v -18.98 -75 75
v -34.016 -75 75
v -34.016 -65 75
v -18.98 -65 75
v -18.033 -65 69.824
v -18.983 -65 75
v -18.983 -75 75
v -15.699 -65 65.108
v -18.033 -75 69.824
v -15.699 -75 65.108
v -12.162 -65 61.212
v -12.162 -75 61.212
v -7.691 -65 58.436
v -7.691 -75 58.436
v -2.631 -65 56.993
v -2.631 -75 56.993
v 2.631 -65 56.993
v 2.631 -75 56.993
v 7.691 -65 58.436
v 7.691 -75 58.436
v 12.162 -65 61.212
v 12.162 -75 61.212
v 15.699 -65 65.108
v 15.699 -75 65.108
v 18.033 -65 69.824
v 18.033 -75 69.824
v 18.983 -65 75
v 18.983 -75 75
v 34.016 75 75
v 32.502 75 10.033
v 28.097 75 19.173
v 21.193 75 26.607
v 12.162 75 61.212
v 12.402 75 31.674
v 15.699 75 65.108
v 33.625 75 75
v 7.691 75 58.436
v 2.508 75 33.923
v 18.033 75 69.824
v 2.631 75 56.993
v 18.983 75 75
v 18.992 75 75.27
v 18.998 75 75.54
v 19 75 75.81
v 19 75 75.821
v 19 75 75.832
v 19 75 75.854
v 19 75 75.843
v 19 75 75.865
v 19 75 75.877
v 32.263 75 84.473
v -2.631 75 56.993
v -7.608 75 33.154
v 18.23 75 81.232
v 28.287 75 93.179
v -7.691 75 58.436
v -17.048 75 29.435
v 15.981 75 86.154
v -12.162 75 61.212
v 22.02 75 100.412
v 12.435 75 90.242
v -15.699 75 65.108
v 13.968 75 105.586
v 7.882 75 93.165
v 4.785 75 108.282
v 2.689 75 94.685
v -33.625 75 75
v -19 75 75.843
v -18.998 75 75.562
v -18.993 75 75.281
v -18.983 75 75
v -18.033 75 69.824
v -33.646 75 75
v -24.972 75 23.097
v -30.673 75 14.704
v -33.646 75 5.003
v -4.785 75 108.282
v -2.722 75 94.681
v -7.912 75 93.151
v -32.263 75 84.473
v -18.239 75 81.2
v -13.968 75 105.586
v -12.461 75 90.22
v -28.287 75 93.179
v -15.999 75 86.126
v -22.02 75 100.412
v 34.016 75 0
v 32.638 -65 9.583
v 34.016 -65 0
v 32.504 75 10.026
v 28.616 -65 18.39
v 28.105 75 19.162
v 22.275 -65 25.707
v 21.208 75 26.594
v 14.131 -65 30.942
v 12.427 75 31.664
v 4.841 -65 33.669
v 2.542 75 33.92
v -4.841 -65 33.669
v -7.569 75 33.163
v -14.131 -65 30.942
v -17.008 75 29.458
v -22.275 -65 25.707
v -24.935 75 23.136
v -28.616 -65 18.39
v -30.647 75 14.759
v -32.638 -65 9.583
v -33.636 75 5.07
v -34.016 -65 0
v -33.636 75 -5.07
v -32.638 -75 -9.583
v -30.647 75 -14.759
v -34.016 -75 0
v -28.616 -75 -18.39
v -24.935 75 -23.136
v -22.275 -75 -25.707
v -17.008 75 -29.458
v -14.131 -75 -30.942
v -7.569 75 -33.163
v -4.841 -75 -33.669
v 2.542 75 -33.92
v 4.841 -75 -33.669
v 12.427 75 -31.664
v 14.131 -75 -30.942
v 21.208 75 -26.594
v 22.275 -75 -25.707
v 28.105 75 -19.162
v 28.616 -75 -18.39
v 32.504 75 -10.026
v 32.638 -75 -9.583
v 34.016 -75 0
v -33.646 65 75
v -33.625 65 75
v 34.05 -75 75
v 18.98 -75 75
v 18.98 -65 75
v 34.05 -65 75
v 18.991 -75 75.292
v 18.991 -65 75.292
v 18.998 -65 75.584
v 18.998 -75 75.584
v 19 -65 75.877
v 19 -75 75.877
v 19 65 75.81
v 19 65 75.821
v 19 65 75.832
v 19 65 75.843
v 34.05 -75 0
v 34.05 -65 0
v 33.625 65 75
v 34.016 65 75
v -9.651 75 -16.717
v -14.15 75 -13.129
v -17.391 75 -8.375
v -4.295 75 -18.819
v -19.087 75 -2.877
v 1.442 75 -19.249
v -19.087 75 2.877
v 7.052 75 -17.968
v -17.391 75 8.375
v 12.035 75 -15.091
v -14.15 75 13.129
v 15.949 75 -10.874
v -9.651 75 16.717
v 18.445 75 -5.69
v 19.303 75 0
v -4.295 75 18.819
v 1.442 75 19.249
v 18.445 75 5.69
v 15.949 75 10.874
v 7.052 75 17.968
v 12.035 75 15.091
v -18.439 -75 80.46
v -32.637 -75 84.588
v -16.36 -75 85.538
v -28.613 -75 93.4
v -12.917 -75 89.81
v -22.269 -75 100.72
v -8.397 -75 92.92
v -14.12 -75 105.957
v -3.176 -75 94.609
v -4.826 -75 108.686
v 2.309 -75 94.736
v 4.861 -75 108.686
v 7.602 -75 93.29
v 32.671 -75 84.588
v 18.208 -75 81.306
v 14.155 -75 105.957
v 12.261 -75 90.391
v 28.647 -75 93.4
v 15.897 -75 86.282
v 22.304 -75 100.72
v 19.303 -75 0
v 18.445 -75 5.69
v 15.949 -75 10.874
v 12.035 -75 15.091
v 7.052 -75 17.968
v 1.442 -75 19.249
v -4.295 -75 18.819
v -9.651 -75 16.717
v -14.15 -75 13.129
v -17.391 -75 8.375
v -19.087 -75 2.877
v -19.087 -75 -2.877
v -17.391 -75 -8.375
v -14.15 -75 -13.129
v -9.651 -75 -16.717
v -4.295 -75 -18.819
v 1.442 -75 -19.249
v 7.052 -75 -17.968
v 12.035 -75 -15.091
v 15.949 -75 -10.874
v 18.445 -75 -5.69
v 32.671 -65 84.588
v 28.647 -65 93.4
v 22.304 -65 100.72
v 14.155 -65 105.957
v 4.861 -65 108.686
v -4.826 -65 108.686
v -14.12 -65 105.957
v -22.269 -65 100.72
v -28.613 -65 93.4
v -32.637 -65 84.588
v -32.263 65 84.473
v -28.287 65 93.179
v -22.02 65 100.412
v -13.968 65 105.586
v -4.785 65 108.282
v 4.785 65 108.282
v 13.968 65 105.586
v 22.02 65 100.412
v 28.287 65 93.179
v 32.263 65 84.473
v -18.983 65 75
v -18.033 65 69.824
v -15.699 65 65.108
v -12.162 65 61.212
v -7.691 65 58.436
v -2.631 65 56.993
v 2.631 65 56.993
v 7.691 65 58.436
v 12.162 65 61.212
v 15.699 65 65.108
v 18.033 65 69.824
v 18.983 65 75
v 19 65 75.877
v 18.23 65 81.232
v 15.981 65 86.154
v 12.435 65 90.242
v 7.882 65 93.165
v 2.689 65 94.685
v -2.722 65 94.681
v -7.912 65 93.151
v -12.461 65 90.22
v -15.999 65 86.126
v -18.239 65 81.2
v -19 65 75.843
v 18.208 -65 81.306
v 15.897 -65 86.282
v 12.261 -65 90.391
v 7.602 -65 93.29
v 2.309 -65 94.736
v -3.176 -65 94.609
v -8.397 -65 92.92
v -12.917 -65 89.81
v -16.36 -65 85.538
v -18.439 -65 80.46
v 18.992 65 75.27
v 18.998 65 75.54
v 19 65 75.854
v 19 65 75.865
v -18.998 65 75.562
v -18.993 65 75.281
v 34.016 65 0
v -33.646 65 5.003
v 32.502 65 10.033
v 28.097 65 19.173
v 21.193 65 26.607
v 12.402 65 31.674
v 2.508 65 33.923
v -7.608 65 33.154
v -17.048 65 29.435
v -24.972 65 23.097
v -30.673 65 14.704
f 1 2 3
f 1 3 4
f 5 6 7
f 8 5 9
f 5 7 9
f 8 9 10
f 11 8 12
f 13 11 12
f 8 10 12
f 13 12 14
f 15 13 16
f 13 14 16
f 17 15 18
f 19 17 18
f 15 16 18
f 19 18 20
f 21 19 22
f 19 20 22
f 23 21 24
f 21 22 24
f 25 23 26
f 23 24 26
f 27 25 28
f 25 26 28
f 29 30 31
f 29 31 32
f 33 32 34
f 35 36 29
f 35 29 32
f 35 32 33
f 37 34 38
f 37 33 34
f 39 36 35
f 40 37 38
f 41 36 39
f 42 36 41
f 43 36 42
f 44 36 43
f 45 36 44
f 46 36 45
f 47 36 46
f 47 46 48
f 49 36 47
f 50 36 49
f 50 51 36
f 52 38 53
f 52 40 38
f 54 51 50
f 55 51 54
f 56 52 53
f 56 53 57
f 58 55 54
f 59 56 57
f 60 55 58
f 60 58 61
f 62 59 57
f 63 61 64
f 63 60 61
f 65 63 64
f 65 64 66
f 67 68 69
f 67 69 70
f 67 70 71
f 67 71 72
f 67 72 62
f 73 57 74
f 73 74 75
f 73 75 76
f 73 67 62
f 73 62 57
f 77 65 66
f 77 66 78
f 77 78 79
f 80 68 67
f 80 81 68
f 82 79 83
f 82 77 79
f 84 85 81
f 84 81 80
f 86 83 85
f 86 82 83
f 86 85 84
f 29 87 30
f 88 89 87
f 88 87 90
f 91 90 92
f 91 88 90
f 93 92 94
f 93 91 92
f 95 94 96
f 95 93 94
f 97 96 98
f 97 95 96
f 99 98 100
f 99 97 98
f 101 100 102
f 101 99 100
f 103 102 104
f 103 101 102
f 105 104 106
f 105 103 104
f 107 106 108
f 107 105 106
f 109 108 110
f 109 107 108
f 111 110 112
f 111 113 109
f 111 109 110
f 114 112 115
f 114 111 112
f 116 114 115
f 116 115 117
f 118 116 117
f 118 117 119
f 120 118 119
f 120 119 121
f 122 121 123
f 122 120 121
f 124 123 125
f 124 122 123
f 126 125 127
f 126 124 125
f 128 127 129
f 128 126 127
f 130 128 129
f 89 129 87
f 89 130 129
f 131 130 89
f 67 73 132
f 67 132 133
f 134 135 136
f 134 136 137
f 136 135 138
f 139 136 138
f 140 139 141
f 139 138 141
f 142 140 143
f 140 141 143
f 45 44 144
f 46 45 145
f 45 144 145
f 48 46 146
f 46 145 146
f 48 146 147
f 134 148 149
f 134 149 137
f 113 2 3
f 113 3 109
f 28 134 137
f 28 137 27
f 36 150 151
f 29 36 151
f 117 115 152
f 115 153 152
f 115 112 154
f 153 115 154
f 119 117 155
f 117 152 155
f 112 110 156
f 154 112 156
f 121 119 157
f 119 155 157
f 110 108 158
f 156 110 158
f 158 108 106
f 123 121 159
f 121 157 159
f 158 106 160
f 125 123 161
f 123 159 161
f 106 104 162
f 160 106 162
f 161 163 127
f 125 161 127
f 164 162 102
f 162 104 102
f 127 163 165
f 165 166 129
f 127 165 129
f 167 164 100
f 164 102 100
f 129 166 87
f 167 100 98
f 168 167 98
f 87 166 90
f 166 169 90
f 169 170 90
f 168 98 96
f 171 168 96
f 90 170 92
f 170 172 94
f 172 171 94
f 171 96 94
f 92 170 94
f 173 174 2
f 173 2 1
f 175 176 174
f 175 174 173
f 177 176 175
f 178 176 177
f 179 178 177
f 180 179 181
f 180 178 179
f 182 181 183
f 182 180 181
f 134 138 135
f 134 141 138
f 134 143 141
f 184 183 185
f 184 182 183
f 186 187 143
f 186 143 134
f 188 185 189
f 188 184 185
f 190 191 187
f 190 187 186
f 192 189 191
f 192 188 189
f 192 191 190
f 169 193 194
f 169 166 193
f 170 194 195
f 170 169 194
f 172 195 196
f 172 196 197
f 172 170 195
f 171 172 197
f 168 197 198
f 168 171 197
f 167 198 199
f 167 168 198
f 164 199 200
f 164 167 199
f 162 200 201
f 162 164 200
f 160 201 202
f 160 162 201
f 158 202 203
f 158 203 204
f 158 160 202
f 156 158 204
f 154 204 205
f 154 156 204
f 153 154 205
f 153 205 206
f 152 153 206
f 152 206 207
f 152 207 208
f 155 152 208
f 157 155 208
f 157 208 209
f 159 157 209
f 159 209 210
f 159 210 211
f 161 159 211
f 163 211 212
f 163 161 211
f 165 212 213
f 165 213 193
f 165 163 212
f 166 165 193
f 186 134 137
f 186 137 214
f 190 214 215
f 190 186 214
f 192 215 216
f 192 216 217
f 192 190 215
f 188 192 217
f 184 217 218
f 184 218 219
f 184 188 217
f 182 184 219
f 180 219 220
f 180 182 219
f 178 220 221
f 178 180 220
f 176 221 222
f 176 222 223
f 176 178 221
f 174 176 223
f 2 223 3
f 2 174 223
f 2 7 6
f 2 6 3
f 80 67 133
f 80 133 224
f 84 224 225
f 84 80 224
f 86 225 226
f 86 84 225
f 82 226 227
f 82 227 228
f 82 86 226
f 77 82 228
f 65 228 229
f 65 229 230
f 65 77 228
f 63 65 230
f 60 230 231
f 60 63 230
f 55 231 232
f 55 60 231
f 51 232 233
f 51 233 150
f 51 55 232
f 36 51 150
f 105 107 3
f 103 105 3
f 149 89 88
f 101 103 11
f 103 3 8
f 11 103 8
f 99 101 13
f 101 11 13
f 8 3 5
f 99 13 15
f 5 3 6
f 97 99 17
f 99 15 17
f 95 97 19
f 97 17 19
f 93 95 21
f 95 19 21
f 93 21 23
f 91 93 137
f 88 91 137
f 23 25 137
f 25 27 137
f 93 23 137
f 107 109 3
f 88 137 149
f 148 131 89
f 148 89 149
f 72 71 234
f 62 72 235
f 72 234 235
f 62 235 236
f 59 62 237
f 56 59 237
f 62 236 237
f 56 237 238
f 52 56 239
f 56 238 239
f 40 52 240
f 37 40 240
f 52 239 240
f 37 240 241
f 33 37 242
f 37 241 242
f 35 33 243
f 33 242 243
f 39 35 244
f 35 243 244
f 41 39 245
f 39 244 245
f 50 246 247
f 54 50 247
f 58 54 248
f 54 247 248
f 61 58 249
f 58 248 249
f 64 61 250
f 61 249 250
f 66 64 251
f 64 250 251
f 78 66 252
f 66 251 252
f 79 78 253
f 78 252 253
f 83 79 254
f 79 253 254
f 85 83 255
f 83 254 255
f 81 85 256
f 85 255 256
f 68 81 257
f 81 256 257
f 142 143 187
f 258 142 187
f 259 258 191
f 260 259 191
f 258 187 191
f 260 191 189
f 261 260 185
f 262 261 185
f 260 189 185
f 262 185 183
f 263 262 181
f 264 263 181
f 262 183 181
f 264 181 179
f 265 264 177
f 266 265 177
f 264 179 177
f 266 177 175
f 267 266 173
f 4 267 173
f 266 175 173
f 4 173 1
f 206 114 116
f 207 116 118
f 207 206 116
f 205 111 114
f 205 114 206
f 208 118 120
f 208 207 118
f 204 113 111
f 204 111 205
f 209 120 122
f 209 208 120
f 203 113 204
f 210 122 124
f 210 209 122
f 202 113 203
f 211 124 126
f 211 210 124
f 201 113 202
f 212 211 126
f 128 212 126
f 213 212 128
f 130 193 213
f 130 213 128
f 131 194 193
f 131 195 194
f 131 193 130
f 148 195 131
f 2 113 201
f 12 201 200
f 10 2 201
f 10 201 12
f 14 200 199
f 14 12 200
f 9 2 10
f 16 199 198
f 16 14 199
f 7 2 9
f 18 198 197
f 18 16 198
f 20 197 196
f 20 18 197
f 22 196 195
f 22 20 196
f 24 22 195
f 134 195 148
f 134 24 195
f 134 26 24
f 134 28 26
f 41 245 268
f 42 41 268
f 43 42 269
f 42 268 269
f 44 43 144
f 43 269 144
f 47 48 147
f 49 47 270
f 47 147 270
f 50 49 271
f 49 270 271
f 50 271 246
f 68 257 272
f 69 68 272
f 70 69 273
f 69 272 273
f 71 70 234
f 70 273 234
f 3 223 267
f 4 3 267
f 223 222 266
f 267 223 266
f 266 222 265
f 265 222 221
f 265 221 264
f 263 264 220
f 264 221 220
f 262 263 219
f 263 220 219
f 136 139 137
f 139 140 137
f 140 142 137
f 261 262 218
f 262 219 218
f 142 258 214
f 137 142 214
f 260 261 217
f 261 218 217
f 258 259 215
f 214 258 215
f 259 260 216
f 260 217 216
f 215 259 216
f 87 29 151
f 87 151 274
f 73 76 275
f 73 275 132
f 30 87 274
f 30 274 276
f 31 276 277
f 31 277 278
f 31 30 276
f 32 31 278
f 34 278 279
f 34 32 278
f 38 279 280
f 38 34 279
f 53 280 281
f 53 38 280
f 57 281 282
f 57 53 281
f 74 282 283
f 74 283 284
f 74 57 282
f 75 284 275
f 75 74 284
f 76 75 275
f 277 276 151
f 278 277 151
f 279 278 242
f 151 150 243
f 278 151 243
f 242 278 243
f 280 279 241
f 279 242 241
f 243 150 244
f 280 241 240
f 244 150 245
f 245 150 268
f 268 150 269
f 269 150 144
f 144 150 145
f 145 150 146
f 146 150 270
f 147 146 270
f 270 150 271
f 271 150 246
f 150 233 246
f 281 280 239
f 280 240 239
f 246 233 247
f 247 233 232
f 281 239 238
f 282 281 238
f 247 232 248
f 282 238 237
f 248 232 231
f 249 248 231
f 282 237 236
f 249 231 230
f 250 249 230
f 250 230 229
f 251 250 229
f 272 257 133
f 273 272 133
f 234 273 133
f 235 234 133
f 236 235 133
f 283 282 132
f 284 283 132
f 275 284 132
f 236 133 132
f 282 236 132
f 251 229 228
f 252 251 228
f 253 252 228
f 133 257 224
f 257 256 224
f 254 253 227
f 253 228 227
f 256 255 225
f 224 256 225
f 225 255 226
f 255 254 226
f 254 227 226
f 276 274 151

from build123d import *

# Parameters (mm, degrees)
F0_R      = 34.0155305384
F0_R_2    = 19.302709337
F1_DEPTH  = 75
F4_DEPTH  = 10
F6_DEPTH  = 10
F8_DEPTH  = 10
F10_DEPTH = 10
F13_DEPTH = 150
F15_DEPTH = 150


with BuildPart() as f1:
    # F0 (on Front) → F1 (new body)
    with BuildSketch(Plane.XZ):
        Circle(F0_R)
        Circle(F0_R_2, mode=Mode.SUBTRACT)
    extrude(amount=F1_DEPTH)

    # F2: F1 across face


with BuildPart() as f1_1:
    add(f1.part)
    add(f1.part.mirror(Plane(origin=(0, 0, 0), x_dir=(1, 0, 0), z_dir=(0, 1, 0))))

    # F3 (on face) → F4 (join)
    with BuildSketch(Plane.XZ.offset(75)):
        with BuildLine():
            ThreePointArc((-34.0155305384, 0), (0, 34.0155305384), (34.0155305384, 0))
            Line((34.0155305384, 0), (34.0500511229, 0))
            Line((34.0500511229, 0), (34.0500511229, 75))
            Line((34.0500511229, 75), (-34.0155305384, 75))
            Line((-34.0155305384, 75), (-34.0155305384, 0))
        make_face()
    extrude(amount=-F4_DEPTH)


with BuildPart() as f6:
    # F5 (on face) → F6 (new body)
    with BuildSketch(Plane(origin=(0, 75, 0), x_dir=(-1, 0, 0), z_dir=(0, 1, 0))):
        with BuildLine():
            ThreePointArc((-34.0155305384, 0), (-2.5084884013, 33.9229097182), (33.6455516517, 5.0033160864))
            Line((33.6455516517, 5.0033160864), (33.6455516517, 75))
            Line((33.6455516517, 75), (-34.0155305384, 75))
            Line((-34.0155305384, 75), (-34.0155305384, 0))
        make_face()
    extrude(amount=-F6_DEPTH)

    # F9 (on face) → F10 (join)
    with BuildSketch(Plane(origin=(0, 75, 0), x_dir=(-1, 0, 0), z_dir=(0, 1, 0))):
        with BuildLine():
            Line((-33.6247164241, 75), (33.6247164241, 75))
            ThreePointArc((33.6247164241, 75), (0, 108.6247164241), (-33.6247164241, 75))
        make_face()
    extrude(amount=-F10_DEPTH)


with BuildPart() as f8:
    # F7 (on face) → F8 (new body)
    with BuildSketch(Plane.XZ.offset(75)):
        with BuildLine():
            Line((-34.0155305384, 75), (34.0500511229, 75))
            ThreePointArc((34.0500511229, 75), (0.0172602923, 109.0327908307), (-34.0155305384, 75))
        make_face()
    extrude(amount=-F8_DEPTH)


with BuildPart() as f13_tool:
    # F12 (on face) → F13 (new body)
    with BuildSketch(Plane.XZ.offset(75)):
        with BuildLine():
            ThreePointArc((18.9827272831, 75), (18.99568133, 75.4048970909), (19, 75.8099783304))
            ThreePointArc((19, 75.8099783304), (-0.4050812395, 94.8056596604), (-18.9827272831, 75))
            Line((-18.9827272831, 75), (18.9827272831, 75))
        make_face()
        with BuildLine():
            Line((18.9827272831, 75), (-18.9827272831, 75))
            ThreePointArc((-18.9827272831, 75), (0, 56.8099783304), (18.9827272831, 75))
        make_face()
    extrude(amount=-F13_DEPTH)


with BuildPart() as f1_2:
    add(f1_1.part)

    # F13: cut by f13_tool
    add(f13_tool.part, mode=Mode.SUBTRACT)


with BuildPart() as f6_1:
    add(f6.part)

    # F13: cut by f13_tool
    add(f13_tool.part, mode=Mode.SUBTRACT)


with BuildPart() as f15_tool:
    # F14 (on face) → F15 (new body)
    with BuildSketch(Plane.XZ.offset(75)):
        with BuildLine():
            ThreePointArc((18.9797715307, 75), (18.9949422095, 75.4381391222), (19, 75.8765116334))
            ThreePointArc((19, 75.8765116334), (-0.4383725112, 94.8714538429), (-18.9797715307, 75))
            Line((-18.9797715307, 75), (18.9797715307, 75))
        make_face()
    extrude(amount=-F15_DEPTH)


with BuildPart() as f6_2:
    add(f6_1.part)

    # F15: cut by f15_tool
    add(f15_tool.part, mode=Mode.SUBTRACT)


with BuildPart() as f8_1:
    add(f8.part)

    # F15: cut by f15_tool
    add(f15_tool.part, mode=Mode.SUBTRACT)


solid = Compound([f1_2.part, f6_2.part, f8_1.part])
